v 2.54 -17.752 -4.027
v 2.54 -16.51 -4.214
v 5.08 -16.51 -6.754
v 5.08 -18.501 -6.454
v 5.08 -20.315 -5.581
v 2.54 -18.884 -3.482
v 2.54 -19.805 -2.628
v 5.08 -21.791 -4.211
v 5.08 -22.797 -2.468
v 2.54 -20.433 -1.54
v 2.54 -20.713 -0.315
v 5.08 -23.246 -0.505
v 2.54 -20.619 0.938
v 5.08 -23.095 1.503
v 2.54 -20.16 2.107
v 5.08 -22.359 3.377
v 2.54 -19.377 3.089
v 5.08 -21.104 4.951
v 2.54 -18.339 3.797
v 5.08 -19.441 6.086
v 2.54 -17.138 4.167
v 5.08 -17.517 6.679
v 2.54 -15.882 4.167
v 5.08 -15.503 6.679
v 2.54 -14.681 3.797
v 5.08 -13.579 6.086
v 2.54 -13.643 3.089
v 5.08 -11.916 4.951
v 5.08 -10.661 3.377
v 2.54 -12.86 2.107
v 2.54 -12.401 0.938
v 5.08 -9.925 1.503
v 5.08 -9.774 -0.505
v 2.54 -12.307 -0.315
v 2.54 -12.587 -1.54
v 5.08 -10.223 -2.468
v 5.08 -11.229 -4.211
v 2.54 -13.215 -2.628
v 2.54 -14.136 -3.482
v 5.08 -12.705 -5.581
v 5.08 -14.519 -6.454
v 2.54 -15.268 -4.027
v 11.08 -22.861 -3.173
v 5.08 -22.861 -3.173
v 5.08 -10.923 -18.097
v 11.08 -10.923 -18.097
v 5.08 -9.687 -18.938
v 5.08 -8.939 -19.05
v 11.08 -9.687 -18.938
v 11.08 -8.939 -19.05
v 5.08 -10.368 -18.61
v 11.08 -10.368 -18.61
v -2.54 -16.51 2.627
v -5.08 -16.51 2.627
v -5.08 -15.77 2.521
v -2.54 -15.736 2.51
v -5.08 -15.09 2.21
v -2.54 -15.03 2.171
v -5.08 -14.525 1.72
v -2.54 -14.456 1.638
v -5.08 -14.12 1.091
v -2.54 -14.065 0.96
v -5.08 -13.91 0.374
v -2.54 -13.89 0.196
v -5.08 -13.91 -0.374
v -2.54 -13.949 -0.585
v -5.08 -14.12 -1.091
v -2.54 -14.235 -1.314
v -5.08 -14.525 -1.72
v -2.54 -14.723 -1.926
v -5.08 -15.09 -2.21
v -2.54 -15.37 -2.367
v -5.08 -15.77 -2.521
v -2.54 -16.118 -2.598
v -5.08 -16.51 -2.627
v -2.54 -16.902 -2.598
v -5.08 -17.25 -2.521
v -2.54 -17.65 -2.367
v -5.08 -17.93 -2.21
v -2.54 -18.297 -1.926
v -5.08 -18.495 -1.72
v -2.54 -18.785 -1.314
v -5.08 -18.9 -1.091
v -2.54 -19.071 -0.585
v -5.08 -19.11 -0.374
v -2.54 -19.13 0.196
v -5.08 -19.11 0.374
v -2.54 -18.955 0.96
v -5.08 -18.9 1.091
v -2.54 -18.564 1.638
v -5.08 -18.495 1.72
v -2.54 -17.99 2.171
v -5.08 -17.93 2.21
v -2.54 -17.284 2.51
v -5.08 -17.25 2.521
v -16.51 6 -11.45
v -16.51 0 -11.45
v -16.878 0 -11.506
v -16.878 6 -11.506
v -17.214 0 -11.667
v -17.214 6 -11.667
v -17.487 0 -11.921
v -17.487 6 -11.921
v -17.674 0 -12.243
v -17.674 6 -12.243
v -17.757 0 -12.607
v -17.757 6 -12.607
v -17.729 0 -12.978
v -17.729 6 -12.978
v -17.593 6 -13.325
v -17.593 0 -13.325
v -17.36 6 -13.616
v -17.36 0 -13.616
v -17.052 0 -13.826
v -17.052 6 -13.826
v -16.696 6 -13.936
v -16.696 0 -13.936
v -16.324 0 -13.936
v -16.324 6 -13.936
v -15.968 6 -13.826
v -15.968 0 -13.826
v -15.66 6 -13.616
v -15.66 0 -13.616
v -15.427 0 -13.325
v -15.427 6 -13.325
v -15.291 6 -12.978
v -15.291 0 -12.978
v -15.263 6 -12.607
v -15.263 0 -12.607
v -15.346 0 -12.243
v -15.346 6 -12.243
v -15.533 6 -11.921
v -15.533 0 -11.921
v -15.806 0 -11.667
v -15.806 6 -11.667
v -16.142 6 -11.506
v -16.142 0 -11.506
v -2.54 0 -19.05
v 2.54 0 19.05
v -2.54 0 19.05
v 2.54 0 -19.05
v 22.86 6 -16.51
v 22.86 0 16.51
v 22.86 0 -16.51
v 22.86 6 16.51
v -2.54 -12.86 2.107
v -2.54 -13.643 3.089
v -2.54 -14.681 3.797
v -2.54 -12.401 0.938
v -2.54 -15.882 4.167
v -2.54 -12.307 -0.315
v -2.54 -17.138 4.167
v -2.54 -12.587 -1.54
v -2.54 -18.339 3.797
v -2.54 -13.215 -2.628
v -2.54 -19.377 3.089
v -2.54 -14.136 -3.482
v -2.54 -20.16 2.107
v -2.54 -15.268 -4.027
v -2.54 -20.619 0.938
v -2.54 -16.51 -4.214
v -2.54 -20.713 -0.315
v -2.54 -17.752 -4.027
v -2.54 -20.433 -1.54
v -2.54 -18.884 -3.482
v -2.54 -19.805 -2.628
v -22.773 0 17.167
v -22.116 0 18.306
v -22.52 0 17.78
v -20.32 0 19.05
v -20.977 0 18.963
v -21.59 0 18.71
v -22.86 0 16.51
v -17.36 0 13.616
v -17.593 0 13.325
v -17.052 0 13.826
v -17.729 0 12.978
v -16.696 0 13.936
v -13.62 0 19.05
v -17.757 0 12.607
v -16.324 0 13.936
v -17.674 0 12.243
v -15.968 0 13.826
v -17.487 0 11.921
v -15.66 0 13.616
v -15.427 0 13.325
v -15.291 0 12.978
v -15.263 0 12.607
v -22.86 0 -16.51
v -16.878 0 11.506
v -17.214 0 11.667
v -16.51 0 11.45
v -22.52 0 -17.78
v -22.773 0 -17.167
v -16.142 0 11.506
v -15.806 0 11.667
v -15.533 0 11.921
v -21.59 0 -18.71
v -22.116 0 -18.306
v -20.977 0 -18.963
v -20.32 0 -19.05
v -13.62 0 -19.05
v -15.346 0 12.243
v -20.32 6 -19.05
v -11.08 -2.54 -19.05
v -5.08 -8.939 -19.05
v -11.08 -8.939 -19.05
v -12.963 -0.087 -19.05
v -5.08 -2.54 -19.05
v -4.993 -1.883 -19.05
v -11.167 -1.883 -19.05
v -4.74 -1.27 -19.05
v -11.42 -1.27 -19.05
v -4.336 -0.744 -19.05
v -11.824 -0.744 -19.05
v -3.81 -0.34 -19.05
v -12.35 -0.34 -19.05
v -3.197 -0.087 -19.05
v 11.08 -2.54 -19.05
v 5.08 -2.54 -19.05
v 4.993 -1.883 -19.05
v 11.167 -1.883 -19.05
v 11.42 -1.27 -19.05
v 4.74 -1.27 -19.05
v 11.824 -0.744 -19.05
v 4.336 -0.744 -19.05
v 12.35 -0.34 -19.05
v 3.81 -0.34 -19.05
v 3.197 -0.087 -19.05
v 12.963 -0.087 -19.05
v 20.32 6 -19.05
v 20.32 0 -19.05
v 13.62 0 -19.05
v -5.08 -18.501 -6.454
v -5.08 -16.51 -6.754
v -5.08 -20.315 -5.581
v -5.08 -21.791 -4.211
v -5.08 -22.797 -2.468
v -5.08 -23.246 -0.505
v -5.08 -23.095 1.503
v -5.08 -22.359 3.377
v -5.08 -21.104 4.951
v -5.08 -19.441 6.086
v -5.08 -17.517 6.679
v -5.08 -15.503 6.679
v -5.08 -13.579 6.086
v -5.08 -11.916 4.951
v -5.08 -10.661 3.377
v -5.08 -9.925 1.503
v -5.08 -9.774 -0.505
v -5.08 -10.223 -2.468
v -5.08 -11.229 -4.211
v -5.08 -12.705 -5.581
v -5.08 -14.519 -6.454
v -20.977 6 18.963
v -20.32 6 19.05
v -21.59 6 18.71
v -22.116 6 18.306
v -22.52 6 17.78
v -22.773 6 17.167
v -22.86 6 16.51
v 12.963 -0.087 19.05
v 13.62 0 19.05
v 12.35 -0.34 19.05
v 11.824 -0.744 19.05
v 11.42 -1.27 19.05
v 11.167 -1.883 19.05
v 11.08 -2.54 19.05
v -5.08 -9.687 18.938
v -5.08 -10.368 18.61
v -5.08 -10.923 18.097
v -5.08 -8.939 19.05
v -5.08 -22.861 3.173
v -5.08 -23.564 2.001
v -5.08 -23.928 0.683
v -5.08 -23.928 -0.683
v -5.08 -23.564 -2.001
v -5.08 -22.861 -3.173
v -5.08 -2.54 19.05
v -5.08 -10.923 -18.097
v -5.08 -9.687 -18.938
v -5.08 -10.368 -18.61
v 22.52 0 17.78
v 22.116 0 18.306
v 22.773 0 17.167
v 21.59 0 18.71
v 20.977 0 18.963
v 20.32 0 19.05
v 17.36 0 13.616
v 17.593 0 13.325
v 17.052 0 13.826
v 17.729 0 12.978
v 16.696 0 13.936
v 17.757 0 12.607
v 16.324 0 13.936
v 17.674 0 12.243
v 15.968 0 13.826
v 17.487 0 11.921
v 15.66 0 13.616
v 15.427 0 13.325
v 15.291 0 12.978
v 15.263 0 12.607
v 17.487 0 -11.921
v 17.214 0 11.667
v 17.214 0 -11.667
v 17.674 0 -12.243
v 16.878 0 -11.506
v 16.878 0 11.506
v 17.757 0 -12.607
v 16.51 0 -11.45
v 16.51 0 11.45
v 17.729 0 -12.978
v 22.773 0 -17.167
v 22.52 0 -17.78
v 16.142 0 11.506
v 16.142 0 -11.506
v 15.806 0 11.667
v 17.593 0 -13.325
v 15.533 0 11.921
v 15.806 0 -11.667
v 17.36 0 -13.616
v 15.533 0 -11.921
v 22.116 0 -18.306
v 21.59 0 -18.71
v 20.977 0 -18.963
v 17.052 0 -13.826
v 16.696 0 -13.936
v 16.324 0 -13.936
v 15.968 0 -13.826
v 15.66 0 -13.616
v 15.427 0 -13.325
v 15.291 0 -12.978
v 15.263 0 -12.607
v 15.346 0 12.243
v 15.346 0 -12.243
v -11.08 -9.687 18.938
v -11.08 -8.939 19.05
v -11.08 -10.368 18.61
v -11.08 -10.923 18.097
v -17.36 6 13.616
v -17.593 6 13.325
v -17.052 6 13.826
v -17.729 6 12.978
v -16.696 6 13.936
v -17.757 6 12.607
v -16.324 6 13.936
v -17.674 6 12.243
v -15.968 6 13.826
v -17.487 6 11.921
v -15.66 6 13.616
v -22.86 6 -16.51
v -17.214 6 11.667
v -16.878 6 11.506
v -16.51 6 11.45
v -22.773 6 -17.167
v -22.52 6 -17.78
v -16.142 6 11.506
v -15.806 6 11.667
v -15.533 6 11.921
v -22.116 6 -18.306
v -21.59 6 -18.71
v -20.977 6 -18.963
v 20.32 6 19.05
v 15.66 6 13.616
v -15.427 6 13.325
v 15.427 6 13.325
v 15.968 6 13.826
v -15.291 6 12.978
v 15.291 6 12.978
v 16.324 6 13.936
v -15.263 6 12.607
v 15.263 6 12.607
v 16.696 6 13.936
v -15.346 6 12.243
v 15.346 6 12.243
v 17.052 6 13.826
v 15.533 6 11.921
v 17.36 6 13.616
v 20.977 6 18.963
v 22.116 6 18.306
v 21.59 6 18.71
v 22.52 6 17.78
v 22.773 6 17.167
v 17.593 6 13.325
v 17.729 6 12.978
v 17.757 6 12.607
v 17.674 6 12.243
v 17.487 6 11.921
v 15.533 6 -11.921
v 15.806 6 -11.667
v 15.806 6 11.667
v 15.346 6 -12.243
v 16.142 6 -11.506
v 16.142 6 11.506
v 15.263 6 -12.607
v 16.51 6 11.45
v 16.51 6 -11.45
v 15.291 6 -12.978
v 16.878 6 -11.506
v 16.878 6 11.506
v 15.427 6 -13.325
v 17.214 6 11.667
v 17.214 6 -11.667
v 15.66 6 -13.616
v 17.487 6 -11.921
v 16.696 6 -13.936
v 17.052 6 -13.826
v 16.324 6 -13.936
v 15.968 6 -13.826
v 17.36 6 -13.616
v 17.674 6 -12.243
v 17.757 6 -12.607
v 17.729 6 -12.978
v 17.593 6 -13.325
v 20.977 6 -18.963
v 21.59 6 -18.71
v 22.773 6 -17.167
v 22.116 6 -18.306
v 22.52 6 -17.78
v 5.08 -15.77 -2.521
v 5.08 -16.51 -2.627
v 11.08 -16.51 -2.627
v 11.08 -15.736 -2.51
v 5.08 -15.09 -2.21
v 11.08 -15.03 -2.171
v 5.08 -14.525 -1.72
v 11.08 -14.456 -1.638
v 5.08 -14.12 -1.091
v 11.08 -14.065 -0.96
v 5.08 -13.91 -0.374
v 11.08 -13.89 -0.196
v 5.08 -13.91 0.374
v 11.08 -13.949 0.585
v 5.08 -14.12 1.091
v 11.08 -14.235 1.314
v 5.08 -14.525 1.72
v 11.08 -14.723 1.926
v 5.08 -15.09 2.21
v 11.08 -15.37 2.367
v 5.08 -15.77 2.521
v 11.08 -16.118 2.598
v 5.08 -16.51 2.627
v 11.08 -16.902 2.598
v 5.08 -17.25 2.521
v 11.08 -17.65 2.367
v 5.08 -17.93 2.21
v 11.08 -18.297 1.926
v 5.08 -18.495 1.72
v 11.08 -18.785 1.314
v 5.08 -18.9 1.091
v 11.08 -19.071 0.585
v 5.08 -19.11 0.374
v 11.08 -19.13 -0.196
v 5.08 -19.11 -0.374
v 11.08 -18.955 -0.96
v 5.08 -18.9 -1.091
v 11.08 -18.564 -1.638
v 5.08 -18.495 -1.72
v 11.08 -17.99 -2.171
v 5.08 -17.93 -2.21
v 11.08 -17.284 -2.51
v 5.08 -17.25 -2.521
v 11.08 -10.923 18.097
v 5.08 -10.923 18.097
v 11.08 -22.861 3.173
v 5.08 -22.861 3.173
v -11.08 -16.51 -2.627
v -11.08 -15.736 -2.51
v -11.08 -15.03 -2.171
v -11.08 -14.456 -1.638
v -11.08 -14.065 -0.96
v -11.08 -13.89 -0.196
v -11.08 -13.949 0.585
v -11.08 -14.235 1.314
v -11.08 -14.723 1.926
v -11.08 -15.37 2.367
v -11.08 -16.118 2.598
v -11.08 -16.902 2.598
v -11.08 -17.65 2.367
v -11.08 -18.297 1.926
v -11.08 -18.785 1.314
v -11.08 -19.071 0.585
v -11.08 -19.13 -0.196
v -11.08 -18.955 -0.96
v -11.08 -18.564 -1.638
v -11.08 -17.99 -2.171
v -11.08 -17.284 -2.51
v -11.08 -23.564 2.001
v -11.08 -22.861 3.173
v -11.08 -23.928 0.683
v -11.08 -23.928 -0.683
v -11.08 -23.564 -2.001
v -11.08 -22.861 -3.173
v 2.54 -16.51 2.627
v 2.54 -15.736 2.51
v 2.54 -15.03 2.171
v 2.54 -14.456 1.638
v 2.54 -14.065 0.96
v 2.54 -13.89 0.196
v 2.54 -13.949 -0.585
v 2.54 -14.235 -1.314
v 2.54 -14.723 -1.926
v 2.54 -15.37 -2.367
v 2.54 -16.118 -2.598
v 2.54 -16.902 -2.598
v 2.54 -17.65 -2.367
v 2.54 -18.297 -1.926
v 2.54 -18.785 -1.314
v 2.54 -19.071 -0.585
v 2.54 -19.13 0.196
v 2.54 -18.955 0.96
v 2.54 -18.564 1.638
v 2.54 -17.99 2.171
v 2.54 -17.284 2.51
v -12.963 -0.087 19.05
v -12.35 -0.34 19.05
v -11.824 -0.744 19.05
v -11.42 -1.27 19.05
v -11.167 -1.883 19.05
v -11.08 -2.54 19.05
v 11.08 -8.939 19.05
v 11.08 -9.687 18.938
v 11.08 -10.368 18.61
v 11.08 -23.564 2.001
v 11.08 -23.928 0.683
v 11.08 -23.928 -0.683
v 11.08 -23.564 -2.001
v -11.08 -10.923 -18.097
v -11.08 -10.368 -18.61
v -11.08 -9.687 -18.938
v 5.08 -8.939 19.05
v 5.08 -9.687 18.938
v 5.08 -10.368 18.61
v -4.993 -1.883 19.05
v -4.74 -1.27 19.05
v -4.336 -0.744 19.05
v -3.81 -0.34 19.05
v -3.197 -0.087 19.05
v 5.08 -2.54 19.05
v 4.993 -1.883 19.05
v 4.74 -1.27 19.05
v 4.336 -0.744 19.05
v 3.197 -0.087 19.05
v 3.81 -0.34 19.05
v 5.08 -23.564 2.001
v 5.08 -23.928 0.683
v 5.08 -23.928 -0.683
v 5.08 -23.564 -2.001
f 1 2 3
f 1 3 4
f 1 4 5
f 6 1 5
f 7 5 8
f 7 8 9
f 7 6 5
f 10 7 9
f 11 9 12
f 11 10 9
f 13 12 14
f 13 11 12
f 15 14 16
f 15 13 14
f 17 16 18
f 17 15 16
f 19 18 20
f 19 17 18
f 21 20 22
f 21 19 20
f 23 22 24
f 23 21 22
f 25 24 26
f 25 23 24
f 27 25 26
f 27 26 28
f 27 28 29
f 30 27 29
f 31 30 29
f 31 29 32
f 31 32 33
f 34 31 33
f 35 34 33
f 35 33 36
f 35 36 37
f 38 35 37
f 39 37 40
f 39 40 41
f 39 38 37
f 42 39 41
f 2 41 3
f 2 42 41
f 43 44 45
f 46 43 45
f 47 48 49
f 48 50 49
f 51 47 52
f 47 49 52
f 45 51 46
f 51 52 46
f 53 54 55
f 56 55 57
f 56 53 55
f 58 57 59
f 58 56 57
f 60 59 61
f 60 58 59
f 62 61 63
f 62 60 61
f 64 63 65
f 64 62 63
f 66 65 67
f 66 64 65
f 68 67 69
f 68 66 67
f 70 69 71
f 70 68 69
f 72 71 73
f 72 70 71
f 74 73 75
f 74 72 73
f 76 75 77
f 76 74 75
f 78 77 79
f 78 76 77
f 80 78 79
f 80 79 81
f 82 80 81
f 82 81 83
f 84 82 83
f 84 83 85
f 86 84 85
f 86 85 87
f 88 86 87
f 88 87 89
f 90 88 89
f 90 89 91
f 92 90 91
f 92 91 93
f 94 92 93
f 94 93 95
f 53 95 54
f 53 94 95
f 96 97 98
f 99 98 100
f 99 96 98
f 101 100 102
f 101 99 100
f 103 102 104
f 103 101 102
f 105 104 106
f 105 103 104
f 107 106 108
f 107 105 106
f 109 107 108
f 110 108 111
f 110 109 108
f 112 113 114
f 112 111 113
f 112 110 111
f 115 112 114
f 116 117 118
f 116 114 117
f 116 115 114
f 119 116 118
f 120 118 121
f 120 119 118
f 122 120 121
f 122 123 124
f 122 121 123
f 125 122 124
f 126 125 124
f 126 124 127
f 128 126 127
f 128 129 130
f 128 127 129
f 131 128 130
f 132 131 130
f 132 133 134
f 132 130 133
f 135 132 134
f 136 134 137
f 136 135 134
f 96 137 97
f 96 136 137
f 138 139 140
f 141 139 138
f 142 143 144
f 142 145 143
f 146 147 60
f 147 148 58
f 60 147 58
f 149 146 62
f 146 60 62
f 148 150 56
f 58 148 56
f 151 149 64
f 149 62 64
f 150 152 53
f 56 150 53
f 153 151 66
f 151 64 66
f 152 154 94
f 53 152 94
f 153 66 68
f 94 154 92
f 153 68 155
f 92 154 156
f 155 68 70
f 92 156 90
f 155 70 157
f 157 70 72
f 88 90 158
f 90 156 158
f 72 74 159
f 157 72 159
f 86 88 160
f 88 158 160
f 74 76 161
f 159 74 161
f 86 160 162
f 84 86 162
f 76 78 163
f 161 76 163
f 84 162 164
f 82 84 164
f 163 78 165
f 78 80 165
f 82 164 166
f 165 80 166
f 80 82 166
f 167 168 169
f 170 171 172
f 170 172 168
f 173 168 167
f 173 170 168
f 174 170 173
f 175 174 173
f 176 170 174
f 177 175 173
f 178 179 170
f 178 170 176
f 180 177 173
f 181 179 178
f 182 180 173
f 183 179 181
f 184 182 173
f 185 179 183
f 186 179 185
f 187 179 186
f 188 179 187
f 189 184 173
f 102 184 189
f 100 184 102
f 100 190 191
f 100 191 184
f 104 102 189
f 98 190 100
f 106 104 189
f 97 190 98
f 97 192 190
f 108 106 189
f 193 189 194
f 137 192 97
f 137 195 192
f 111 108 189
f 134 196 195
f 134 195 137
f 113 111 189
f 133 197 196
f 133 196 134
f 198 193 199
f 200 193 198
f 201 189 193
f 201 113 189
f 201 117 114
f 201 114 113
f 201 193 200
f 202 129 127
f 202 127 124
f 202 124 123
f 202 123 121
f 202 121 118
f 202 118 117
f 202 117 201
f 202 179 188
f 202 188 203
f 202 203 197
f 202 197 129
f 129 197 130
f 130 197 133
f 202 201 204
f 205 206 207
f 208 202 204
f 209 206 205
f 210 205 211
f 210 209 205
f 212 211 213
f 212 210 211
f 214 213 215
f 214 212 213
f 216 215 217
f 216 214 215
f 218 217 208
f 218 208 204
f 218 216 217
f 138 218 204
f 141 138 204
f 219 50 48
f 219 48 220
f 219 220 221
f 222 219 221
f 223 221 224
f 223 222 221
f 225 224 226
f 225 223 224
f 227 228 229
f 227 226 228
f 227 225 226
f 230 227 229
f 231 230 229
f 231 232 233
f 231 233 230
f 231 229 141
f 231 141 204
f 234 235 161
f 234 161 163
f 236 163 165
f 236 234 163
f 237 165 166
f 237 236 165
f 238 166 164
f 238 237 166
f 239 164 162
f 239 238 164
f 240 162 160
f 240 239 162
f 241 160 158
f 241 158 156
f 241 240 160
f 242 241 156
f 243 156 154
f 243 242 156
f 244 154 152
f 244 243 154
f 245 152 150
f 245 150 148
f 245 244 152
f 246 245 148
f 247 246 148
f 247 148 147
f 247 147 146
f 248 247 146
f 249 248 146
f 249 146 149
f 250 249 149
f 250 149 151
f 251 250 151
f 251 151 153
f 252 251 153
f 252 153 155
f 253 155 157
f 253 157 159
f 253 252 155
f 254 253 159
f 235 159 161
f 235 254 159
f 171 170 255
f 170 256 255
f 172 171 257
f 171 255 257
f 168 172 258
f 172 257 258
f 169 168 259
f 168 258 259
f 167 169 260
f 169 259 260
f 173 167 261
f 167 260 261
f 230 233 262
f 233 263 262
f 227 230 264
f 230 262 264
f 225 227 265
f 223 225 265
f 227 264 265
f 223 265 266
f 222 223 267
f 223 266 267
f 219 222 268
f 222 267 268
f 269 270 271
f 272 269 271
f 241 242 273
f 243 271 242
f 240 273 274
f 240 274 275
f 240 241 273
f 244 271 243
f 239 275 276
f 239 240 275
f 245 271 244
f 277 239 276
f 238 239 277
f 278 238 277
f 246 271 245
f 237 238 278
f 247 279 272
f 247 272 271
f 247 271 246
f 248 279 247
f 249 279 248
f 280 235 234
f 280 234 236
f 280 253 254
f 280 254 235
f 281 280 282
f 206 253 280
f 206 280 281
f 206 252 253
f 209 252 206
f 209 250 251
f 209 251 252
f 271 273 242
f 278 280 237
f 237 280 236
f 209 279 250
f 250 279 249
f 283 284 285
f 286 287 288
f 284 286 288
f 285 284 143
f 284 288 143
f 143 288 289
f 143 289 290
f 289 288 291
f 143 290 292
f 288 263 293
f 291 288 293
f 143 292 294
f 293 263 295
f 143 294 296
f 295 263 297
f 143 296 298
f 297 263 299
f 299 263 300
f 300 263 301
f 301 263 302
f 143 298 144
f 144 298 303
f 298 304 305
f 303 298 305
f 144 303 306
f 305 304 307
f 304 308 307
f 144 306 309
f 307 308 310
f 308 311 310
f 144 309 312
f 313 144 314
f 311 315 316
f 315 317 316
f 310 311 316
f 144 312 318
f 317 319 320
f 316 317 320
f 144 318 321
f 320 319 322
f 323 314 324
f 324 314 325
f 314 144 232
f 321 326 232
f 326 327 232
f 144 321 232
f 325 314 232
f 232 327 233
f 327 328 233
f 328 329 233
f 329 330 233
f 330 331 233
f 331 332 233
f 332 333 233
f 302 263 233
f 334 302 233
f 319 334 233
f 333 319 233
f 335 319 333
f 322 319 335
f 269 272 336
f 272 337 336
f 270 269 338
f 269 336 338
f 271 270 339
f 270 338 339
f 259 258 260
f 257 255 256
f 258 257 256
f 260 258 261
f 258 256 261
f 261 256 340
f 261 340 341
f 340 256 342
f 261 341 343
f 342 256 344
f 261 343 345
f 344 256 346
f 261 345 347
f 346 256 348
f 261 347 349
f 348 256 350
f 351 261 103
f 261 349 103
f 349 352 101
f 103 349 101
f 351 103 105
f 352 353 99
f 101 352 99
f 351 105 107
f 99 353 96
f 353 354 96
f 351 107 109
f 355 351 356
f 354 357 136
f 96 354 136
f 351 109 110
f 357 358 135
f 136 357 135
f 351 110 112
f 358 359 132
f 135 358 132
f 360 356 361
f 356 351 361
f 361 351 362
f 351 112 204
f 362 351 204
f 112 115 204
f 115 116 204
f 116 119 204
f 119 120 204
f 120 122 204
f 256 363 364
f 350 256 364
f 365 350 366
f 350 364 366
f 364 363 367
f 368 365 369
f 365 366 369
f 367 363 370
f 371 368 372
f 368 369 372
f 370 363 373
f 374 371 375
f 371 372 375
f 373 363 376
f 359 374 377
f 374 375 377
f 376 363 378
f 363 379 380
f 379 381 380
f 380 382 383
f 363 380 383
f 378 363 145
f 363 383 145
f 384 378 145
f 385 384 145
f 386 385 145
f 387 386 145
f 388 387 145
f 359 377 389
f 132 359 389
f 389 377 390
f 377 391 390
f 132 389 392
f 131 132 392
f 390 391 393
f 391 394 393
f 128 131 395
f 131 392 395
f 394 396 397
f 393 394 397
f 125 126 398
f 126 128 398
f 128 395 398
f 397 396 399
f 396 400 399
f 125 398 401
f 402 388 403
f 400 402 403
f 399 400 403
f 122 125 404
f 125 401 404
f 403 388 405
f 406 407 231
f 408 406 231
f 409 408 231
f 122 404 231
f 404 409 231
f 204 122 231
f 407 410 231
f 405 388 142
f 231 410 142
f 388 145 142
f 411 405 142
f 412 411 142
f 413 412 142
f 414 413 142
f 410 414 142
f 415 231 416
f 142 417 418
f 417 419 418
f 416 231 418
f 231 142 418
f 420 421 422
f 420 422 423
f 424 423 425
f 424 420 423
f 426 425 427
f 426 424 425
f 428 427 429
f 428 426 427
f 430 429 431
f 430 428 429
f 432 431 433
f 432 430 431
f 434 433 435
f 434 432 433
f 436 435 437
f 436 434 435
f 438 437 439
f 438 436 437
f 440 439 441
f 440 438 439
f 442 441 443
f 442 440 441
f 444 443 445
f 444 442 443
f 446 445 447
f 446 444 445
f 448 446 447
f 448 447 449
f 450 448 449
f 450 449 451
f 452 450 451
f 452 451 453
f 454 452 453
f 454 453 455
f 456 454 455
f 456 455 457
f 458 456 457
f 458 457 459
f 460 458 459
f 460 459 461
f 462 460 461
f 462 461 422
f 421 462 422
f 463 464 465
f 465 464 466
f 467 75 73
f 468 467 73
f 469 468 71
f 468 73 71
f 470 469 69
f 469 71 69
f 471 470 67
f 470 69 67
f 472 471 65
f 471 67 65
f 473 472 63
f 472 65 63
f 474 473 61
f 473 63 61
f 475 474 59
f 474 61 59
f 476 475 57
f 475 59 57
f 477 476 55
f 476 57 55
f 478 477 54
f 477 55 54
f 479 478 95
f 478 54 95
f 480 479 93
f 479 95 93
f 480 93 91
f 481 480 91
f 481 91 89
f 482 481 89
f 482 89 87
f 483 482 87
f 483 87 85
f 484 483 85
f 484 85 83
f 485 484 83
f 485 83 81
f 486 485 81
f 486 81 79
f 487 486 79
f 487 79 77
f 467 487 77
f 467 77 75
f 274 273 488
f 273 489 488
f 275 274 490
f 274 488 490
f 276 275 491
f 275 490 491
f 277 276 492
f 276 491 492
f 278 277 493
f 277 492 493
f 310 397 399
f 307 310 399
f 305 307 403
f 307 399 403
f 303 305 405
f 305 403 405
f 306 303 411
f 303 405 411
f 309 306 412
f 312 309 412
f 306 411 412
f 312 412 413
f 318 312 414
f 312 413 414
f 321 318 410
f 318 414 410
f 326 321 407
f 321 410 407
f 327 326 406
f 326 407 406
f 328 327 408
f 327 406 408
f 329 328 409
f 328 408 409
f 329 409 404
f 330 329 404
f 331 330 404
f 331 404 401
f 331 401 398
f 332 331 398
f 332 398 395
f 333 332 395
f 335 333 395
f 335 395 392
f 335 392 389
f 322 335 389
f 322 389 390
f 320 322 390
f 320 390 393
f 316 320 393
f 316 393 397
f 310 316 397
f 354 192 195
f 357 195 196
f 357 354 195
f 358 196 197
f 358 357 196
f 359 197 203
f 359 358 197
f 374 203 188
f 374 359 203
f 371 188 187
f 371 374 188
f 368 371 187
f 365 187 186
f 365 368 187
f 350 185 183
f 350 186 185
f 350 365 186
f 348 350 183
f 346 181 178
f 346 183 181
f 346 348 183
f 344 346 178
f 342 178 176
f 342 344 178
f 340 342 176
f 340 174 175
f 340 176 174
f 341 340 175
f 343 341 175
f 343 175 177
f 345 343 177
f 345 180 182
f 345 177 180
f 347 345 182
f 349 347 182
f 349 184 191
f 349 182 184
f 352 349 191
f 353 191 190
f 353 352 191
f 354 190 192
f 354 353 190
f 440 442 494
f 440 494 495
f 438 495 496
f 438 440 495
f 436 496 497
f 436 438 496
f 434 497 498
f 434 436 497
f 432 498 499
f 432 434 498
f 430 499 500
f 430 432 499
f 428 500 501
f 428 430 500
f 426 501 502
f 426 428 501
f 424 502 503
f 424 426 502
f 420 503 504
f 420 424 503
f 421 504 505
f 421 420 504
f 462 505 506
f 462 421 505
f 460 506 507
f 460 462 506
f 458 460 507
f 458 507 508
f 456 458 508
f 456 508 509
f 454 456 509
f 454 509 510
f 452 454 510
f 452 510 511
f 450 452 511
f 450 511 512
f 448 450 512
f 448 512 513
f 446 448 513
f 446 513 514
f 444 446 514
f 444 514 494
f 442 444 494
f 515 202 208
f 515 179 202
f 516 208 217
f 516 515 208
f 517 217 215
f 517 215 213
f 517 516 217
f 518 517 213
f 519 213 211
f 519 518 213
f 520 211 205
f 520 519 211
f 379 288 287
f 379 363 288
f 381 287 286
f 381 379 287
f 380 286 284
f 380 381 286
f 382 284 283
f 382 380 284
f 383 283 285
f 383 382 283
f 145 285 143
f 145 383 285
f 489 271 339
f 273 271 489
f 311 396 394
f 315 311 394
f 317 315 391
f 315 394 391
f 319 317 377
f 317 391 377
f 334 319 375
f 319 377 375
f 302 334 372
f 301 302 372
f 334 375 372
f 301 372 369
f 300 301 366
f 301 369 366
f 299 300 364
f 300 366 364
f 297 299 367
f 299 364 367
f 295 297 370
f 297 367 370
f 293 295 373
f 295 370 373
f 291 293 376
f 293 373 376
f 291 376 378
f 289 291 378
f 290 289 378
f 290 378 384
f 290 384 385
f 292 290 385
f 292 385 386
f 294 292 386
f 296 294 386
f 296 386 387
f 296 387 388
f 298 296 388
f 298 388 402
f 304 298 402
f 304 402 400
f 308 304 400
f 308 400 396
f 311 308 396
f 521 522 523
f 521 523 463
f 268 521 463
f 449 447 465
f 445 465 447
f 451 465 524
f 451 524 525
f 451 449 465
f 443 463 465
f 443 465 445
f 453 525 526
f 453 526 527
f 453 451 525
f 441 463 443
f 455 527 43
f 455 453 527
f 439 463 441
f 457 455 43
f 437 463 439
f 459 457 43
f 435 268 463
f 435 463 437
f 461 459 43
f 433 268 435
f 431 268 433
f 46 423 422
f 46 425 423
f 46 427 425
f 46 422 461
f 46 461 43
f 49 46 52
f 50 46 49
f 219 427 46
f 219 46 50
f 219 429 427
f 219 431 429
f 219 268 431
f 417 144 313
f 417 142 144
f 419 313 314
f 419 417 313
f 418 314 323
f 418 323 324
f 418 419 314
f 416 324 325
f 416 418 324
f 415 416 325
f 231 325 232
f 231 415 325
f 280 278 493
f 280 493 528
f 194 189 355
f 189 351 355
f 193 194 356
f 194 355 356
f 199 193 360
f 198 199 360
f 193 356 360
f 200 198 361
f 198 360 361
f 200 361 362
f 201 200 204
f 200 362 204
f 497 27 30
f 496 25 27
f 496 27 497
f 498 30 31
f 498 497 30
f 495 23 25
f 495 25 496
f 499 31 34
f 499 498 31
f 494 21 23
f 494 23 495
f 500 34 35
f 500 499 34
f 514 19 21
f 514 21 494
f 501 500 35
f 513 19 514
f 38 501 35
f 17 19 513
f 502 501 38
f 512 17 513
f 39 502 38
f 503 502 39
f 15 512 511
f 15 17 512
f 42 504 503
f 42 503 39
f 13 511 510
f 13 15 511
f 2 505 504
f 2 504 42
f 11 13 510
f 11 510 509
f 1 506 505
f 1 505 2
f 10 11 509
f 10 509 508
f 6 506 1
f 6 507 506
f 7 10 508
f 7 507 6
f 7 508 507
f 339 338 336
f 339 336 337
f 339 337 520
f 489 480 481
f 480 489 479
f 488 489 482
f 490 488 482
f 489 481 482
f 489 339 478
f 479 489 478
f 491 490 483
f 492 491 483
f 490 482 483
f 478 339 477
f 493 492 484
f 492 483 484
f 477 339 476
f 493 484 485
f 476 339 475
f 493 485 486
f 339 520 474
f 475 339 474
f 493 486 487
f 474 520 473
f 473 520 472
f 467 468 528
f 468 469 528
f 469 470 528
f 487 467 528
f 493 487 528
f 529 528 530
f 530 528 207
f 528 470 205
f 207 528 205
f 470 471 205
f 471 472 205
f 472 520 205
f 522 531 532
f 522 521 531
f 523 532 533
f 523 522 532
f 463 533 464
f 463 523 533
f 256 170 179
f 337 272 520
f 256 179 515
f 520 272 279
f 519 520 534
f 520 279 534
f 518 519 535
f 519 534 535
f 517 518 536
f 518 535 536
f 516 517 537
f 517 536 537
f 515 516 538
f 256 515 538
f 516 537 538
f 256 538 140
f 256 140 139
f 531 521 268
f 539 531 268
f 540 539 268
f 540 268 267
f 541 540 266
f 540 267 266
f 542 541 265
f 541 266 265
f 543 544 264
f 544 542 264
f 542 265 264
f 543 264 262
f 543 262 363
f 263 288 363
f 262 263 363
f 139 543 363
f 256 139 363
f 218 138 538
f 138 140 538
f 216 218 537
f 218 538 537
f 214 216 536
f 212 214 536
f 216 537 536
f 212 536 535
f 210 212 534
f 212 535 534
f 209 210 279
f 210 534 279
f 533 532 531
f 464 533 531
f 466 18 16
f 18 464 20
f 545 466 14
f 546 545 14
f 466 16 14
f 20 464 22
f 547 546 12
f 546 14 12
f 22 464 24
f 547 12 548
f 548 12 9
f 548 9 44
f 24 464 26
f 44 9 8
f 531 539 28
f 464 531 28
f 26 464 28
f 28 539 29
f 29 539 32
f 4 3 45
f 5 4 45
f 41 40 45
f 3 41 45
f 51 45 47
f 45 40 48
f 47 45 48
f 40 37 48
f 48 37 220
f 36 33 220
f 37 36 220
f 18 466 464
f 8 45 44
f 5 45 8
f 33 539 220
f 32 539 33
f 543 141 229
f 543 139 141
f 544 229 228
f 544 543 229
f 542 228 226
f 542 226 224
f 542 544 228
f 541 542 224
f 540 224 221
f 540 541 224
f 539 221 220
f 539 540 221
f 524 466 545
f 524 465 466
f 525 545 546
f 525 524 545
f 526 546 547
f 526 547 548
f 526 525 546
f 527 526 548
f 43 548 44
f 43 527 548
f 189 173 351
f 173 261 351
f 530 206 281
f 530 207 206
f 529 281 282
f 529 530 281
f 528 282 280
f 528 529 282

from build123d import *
from OCP.BRepFilletAPI import BRepFilletAPI_MakeFillet

# Parameters (mm, degrees)
SKETCH1_R           = 2.627
BOSS_EXTRUDE1_DEPTH = 6
BOSS_EXTRUDE2_START = -5.08
SKETCH1_3_W         = 38.1
SKETCH1_3_H         = 5.999999938
BOSS_EXTRUDE2_DEPTH = 22.86
SKETCH3_R           = 1.25
CUT_EXTRUDE1_DEPTH  = 44.260167546
FILLET1_R1          = 2.54
FILLET1_R2          = 5.08
SKETCH4_R           = 4.2145
SKETCH4_R_2         = 2.627
BOSS_EXTRUDE3_DEPTH = 2.54
BOSS_EXTRUDE4_START = 7.62
SKETCH4_2_R         = 4.2145
SKETCH4_2_R_2       = 2.627
BOSS_EXTRUDE4_DEPTH = 2.54
CHAMFER2_SIZE       = 2.54


with BuildPart() as part:
    # Sketch1 → Boss-Extrude1 (new body)
    with BuildSketch(Plane(origin=(5.08, 0, 0), x_dir=(0, 0, -1), z_dir=(1, 0, 0))):
        Polygon((-19.05, 0), (-19.05, -10.16), (0, -25.4), (19.05, -10.16), (19.05, 0), align=None)
        with Locations((0, -16.51)):
            Circle(SKETCH1_R, mode=Mode.SUBTRACT)
    boss_extrude1 = extrude(amount=BOSS_EXTRUDE1_DEPTH)

    # Sketch1<3> → Boss-Extrude2 (add)
    with BuildSketch(Plane(origin=(5.08, 0, 0), x_dir=(0, 0, -1), z_dir=(1, 0, 0)).offset(BOSS_EXTRUDE2_START)):
        with Locations((0, 2.999999969)):
            Rectangle(SKETCH1_3_W, SKETCH1_3_H)
    boss_extrude2 = extrude(amount=BOSS_EXTRUDE2_DEPTH)

    # Sketch3 → Cut-Extrude1 (cut, through all)
    with BuildSketch(Plane(origin=(0, 5.999999938, 0), x_dir=(1, 0, 0), z_dir=(0, 1, 0))):
        with Locations(Location((16.51, 12.7, 0), (0, 0, 270))):
            Circle(SKETCH3_R)
        with Locations(Location((16.51, -12.7, 0), (0, 0, 90))):
            Circle(SKETCH3_R)
    cut_extrude1 = extrude(amount=-CUT_EXTRUDE1_DEPTH, mode=Mode.SUBTRACT)

    # Mirror2: Boss-Extrude2, Cut-Extrude1 across plane
    add(boss_extrude2.mirror(Plane(origin=(0, 0, 0), x_dir=(0, 0, 1), z_dir=(1, 0, 0))))
    add(cut_extrude1.mirror(Plane(origin=(0, 0, 0), x_dir=(0, 0, 1), z_dir=(1, 0, 0))), mode=Mode.SUBTRACT)

    # Mirror3: Boss-Extrude1 across plane
    add(boss_extrude1.mirror(Plane(origin=(0, 0, 0), x_dir=(0, 0, 1), z_dir=(1, 0, 0))))

    # Fillet1: one fillet with a radius per group of edges: ONE call of the kernel's fillet builder (fillet() takes one radius for all edges)
    fillet1_edges_1 = [part.edges().sort_by_distance(p)[0] for p in [
        (8.08, -10.16, 19.05),
        (8.08, -10.16, -19.05),
        (11.08, 0, 0),
        (22.86, 2.999999969, 19.05),
        (22.86, 2.999999969, -19.05),
        (-22.86, 2.999999969, -19.05),
        (-22.86, 2.999999969, 19.05),
        (-8.08, -10.16, -19.05),
        (-8.08, -10.16, 19.05),
        (-5.08, 0, 0),
        (-11.08, 0, 0),
        (5.08, 0, 0),
    ]]
    fillet1_edges_2 = [part.edges().sort_by_distance(p)[0] for p in [
        (8.08, -25.4, 0),
        (-8.08, -25.4, 0),
    ]]
    fillet1 = BRepFilletAPI_MakeFillet(part.part.solid().wrapped)
    for e in fillet1_edges_1:
        fillet1.Add(FILLET1_R1, e.wrapped)
    for e in fillet1_edges_2:
        fillet1.Add(FILLET1_R2, e.wrapped)
    add(Compound.cast(fillet1.Shape()), mode=Mode.REPLACE)

    # Sketch4 → Boss-Extrude3 (add)
    with BuildSketch(Plane.ZY.offset(-5.08)):
        with Locations(Location((0, -16.51, 0), (0, 0, 180))):
            Circle(SKETCH4_R)
        with Locations((0, -16.51)):
            Circle(SKETCH4_R_2, mode=Mode.SUBTRACT)
    extrude(amount=BOSS_EXTRUDE3_DEPTH)

    # Sketch4<2> → Boss-Extrude4 (add)
    with BuildSketch(Plane.ZY.offset(-5.08).offset(BOSS_EXTRUDE4_START)):
        with Locations(Location((0, -16.51, 0), (0, 0, 180))):
            Circle(SKETCH4_2_R)
        with Locations((0, -16.51)):
            Circle(SKETCH4_2_R_2, mode=Mode.SUBTRACT)
    extrude(amount=BOSS_EXTRUDE4_DEPTH)

    # Chamfer2
    chamfer2_edges = [part.edges().sort_by_distance(p)[0] for p in [
        (5.08, -16.51, 4.2145),
        (-5.08, -16.51, 4.2145),
    ]]
    chamfer(chamfer2_edges, length=CHAMFER2_SIZE - 0.0001)  # a hair under: the kernel refuses the full size


solid = part.part
